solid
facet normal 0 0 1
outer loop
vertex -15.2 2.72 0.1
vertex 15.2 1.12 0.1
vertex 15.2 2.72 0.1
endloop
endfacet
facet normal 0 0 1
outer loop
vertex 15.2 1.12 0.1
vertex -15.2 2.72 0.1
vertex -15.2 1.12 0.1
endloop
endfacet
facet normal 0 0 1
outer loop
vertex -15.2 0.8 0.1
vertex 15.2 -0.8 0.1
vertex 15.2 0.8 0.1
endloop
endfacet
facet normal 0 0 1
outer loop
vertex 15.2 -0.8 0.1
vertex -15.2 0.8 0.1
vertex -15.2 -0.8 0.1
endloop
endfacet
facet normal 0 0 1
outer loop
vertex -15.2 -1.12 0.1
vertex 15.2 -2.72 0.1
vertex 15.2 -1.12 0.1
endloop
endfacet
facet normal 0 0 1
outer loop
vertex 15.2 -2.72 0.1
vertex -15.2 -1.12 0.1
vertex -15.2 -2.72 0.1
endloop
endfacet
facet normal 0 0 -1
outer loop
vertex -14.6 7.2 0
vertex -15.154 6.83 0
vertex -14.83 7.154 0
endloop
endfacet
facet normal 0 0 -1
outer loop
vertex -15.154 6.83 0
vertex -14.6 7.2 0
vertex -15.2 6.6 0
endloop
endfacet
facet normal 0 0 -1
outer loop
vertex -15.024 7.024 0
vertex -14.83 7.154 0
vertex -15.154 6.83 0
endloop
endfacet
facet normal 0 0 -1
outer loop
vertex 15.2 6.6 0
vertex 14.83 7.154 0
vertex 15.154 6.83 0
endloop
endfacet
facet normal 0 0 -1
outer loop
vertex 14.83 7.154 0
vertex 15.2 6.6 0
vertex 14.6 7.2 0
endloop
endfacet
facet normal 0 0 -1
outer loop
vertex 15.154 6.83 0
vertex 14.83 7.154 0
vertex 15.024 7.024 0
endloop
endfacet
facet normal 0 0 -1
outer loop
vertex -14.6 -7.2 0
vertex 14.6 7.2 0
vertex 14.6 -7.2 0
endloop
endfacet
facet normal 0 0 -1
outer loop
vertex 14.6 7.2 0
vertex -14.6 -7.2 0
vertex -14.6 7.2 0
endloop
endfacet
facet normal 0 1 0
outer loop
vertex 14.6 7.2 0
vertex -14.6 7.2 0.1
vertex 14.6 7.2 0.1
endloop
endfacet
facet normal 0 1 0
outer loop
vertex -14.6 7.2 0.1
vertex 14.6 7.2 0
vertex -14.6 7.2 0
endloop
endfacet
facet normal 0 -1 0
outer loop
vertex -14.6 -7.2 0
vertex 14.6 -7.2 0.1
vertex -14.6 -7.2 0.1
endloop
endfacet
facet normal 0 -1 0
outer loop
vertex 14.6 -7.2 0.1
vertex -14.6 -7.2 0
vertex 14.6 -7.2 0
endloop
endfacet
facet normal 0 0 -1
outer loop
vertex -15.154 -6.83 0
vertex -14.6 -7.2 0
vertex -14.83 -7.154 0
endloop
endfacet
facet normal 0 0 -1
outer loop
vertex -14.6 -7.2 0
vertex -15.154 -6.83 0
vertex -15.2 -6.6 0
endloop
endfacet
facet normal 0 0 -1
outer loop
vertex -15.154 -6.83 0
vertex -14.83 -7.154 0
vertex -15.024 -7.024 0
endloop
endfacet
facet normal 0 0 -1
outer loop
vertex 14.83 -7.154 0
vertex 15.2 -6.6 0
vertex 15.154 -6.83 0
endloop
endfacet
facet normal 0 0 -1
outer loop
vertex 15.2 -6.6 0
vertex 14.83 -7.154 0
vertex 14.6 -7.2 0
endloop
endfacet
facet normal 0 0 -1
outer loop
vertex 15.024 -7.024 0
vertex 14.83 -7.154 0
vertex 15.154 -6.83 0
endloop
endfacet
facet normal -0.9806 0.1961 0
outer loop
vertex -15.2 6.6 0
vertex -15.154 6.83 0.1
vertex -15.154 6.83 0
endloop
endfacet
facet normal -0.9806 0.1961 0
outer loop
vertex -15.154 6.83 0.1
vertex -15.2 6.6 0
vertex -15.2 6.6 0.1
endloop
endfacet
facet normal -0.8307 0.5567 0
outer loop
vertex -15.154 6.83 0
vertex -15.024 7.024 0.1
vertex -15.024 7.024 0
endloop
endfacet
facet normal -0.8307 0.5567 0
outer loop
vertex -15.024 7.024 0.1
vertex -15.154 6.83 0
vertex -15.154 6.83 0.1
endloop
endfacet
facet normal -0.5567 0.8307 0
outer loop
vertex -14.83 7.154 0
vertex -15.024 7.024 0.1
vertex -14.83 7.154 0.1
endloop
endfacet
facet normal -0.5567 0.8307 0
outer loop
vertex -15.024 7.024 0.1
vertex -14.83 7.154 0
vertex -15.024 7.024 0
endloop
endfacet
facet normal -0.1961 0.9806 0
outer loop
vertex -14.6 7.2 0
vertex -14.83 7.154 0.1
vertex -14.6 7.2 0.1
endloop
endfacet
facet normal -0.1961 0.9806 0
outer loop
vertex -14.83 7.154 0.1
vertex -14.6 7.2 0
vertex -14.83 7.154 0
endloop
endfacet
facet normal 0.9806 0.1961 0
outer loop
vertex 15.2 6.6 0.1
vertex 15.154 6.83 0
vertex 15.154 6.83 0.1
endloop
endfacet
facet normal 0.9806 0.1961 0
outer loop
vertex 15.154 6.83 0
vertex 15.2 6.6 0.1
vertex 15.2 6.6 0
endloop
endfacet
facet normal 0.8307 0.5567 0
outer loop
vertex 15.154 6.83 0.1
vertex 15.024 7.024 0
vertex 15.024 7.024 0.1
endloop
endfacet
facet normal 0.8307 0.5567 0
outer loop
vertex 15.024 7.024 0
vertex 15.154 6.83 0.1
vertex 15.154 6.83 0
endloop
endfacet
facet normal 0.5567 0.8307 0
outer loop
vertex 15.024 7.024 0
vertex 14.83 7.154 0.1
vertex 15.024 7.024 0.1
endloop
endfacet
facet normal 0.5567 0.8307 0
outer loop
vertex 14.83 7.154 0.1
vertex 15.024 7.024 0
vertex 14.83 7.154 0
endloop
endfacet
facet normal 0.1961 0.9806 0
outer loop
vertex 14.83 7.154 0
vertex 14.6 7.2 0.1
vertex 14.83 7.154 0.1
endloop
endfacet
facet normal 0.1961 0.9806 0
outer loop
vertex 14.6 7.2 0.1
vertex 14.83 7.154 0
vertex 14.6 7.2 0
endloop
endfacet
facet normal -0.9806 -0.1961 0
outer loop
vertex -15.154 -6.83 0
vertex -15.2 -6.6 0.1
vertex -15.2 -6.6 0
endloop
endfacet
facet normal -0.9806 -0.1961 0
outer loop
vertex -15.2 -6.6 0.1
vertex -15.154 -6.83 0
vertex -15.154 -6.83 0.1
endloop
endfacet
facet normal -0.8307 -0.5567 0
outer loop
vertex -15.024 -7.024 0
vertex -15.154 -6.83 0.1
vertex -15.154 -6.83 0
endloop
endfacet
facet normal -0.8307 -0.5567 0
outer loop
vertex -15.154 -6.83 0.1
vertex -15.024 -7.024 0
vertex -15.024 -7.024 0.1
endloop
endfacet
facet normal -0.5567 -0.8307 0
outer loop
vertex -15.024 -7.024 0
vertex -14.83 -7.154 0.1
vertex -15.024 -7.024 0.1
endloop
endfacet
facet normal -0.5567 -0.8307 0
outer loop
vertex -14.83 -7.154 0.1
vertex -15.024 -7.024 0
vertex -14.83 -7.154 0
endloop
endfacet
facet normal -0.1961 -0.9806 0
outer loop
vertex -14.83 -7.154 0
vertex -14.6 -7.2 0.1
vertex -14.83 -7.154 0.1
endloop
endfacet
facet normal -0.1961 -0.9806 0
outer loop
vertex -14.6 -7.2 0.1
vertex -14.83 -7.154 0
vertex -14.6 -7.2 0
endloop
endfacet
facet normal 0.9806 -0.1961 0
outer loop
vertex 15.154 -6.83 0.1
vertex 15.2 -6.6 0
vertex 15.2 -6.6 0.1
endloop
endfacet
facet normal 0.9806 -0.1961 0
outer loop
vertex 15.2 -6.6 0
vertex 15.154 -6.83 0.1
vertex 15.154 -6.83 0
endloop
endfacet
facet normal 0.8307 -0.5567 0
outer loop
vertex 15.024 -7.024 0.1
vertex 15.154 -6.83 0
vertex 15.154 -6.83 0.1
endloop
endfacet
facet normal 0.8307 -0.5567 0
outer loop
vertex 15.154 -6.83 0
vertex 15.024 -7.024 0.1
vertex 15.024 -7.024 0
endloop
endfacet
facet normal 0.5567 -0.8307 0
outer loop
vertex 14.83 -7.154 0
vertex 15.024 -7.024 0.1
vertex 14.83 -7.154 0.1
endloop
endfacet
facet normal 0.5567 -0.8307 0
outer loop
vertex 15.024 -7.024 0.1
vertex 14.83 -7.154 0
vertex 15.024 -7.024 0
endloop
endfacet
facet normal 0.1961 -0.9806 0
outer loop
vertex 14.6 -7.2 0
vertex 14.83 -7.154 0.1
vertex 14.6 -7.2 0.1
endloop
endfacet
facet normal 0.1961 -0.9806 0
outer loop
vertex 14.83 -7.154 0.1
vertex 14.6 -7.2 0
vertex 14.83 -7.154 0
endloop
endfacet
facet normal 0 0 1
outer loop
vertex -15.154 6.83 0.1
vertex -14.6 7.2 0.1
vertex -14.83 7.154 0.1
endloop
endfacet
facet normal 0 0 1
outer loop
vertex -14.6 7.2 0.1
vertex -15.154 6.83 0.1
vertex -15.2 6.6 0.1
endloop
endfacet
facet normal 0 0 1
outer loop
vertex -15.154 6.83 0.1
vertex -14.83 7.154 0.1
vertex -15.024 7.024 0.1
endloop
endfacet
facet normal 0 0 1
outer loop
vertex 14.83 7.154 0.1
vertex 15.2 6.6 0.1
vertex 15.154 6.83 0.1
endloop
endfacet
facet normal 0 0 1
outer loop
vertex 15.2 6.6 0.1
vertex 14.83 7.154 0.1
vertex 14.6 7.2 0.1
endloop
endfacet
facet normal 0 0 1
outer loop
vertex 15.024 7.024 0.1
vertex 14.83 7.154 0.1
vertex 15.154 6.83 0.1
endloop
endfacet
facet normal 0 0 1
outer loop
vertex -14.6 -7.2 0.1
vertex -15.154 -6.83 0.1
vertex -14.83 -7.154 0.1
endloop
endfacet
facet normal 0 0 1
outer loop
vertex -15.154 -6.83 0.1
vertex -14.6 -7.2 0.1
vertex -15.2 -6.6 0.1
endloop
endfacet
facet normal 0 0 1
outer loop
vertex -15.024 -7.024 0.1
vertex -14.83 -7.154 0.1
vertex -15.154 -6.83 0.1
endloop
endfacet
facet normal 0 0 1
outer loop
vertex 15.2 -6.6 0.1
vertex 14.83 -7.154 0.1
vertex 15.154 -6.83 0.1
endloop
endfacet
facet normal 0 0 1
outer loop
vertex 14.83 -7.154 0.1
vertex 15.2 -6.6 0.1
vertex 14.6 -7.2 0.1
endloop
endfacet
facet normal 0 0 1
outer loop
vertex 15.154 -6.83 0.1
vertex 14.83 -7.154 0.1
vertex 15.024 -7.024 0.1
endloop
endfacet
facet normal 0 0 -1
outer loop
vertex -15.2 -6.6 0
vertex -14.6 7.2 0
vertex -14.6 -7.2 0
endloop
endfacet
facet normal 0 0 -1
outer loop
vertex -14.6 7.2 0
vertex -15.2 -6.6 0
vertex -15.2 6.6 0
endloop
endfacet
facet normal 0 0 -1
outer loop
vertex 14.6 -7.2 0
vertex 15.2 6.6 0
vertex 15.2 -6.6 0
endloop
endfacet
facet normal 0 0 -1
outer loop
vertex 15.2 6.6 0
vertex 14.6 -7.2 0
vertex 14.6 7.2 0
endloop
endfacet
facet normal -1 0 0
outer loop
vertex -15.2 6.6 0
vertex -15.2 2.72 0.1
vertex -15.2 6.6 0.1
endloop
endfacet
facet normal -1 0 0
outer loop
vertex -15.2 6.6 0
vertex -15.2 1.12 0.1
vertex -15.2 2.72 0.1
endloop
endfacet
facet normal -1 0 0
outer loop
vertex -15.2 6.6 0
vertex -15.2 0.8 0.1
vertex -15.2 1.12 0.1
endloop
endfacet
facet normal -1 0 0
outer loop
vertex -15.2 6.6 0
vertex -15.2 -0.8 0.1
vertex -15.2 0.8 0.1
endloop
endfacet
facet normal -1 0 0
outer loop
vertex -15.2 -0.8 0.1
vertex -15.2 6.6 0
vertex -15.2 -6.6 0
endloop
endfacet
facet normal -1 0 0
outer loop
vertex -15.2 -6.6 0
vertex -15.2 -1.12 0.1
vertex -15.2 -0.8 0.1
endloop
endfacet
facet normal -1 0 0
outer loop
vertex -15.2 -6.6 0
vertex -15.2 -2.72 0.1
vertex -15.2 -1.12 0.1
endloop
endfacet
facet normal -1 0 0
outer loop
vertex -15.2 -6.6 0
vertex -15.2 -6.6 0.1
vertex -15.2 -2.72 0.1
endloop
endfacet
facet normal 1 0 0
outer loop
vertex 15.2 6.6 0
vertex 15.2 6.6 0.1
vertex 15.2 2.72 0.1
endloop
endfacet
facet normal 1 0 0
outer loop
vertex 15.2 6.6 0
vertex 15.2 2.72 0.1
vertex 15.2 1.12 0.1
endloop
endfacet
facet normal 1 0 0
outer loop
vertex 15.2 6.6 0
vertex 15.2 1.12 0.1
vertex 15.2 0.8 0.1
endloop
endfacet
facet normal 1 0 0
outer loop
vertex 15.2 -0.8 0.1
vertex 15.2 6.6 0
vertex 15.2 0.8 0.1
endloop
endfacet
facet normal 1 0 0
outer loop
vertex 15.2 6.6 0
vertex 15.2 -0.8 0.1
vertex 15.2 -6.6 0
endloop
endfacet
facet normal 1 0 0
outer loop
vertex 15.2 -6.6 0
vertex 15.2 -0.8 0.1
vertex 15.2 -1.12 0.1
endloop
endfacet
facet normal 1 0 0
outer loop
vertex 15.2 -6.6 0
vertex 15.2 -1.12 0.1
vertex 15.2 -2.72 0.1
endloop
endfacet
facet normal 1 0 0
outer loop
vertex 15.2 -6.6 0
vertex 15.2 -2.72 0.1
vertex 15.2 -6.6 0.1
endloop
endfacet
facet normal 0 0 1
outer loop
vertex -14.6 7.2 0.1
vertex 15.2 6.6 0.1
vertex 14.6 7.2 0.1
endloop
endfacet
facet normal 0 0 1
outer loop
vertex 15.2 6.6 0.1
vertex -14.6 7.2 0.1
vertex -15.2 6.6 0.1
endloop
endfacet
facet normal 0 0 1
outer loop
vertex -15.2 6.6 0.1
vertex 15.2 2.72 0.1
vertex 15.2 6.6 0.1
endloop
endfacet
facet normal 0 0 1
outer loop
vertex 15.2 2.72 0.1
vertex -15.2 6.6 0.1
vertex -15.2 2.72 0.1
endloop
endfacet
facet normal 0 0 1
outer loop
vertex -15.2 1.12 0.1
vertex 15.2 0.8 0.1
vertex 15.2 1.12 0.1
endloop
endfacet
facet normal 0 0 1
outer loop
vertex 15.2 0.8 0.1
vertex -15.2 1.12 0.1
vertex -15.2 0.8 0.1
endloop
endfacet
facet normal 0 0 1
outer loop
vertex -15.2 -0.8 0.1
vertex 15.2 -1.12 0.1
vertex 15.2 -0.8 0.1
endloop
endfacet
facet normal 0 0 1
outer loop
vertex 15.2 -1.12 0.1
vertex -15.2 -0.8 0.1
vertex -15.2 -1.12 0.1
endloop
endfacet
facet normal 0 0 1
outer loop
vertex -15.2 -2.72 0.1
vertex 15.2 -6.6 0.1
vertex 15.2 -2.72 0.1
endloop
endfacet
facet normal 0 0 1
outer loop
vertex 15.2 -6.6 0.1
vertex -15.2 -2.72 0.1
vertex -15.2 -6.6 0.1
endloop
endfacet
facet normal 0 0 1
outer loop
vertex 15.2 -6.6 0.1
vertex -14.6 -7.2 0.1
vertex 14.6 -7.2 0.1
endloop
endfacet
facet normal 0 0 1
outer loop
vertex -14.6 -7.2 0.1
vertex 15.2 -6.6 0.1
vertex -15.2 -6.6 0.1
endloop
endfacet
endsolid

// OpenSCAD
// file: ../p/box3u12.scad
use <../lib.scad>
function ldraw_lib__box3u12() = [
// 0 Box with 3 Parallel Faces without Any Edges
// 0 Name: box3u12.dat
// 0 Author: J.C. Tchang [tchang]
// 0 !LDRAW_ORG Primitive UPDATE 2014-02
// 0 !LICENSE Licensed under CC BY 4.0 : see CAreadme.txt
// 
// 0 BFC CERTIFY CCW
  [0,"BFC","CERTIFY"],
  [0,"BFC","CCW"],
// 
// 0 !HISTORY 2014-12-23 [PTadmin] Official Update 2014-02
// 
// 
// 4 16 -1 1 1 1 1 1 1 1 -1 -1 1 -1
  [4,16,-1,1,1,1,1,1,1,1,-1,-1,1,-1],
// 4 16 -1 1 1 -1 0 1 1 0 1 1 1 1
  [4,16,-1,1,1,-1,0,1,1,0,1,1,1,1],
// 4 16 1 1 -1 1 0 -1 -1 0 -1 -1 1 -1
  [4,16,1,1,-1,1,0,-1,-1,0,-1,-1,1,-1],
];
module ldraw_lib__box3u12(step=0, col=false, unit=2/5, alt=false, line=0.2, solid=!$preview)
    makepoly(ldraw_lib__box3u12(), step=step, col=col, unit=unit, alt=alt, line=line, solid=solid);
ldraw_lib__box3u12(line=0.2);
// file: ../p/1-4cyli.scad
use <../lib.scad>
function ldraw_lib__1_4cyli() = [
// 0 Cylinder 0.25
// 0 Name: 1-4cyli.dat
// 0 Author: James Jessiman
// 0 !LDRAW_ORG Primitive UPDATE 2012-01
// 0 !LICENSE Licensed under CC BY 4.0 : see CAreadme.txt
// 
// 0 BFC CERTIFY CCW
  [0,"BFC","CERTIFY"],
  [0,"BFC","CCW"],
// 
// 0 !HISTORY 2002-03-23 [sbliss] Added BFC statement.
// 0 !HISTORY 2002-04-25 [PTadmin] Official Update 2002-02
// 0 !HISTORY 2007-06-22 [PTadmin] Header formatted for Contributor Agreement
// 0 !HISTORY 2008-07-01 [PTadmin] Official Update 2008-01
// 0 !HISTORY 2012-02-16 [Philo] Changed to CCW
// 0 !HISTORY 2012-03-30 [PTadmin] Official Update 2012-01
// 
// 
// 4 16 1 1 0 0.9239 1 0.3827 0.9239 0 0.3827 1 0 0
  [4,16,1,1,0,0.9239,1,0.3827,0.9239,0,0.3827,1,0,0],
// 5 24 1 0 0 1 1 0 0.9239 0 0.3827 1 0 -1
  [5,24,1,0,0,1,1,0,0.9239,0,0.3827,1,0,-1],
// 4 16 0.9239 1 0.3827 0.7071 1 0.7071 0.7071 0 0.7071 0.9239 0 0.3827
  [4,16,0.9239,1,0.3827,0.7071,1,0.7071,0.7071,0,0.7071,0.9239,0,0.3827],
// 5 24 0.9239 0 0.3827 0.9239 1 0.3827 0.7071 0 0.7071 1 0 0
  [5,24,0.9239,0,0.3827,0.9239,1,0.3827,0.7071,0,0.7071,1,0,0],
// 4 16 0.7071 1 0.7071 0.3827 1 0.9239 0.3827 0 0.9239 0.7071 0 0.7071
  [4,16,0.7071,1,0.7071,0.3827,1,0.9239,0.3827,0,0.9239,0.7071,0,0.7071],
// 5 24 0.7071 0 0.7071 0.7071 1 0.7071 0.3827 0 0.9239 0.9239 0 0.3827
  [5,24,0.7071,0,0.7071,0.7071,1,0.7071,0.3827,0,0.9239,0.9239,0,0.3827],
// 4 16 0.3827 1 0.9239 0 1 1 0 0 1 0.3827 0 0.9239
  [4,16,0.3827,1,0.9239,0,1,1,0,0,1,0.3827,0,0.9239],
// 5 24 0.3827 0 0.9239 0.3827 1 0.9239 0 0 1 0.7071 0 0.7071
  [5,24,0.3827,0,0.9239,0.3827,1,0.9239,0,0,1,0.7071,0,0.7071],
// 5 24 0 0 1 0 1 1 0.3827 0 0.9239 -1 0 1
  [5,24,0,0,1,0,1,1,0.3827,0,0.9239,-1,0,1],
];
module ldraw_lib__1_4cyli(step=0, col=false, unit=2/5, alt=false, line=0.2, solid=!$preview)
    makepoly(ldraw_lib__1_4cyli(), step=step, col=col, unit=unit, alt=alt, line=line, solid=solid);
ldraw_lib__1_4cyli(line=0.2);
// file: ../p/1-4chrd.scad
use <../lib.scad>
function ldraw_lib__1_4chrd() = [
// 0 Chord 0.25
// 0 Name: 1-4chrd.dat
// 0 Author: Max Martin Richter [MMR1988]
// 0 !LDRAW_ORG Primitive UPDATE 2023-05
// 0 !LICENSE Licensed under CC BY 4.0 : see CAreadme.txt
// 
// 0 BFC CERTIFY CCW
  [0,"BFC","CERTIFY"],
  [0,"BFC","CCW"],
// 
// 0 !HISTORY 2004-04-22 [PTadmin] Official Update 2004-02
// 0 !HISTORY 2007-10-09 [PTadmin] Header formatted for Contributor Agreement
// 0 !HISTORY 2008-07-01 [PTadmin] Official Update 2008-01
// 0 !HISTORY 2012-08-02 [MMR1988] Re-creation with PrimGen2 and Rectifier
// 0 !HISTORY 2012-08-09 [PTadmin] Official Update 2012-02
// 0 !HISTORY 2023-10-27 [OrionP] Change author to MMR1988 from hafhead
// 0 !HISTORY 2023-10-31 [OrionP] Official Update 2023-05
// 
// 4 16 0.9239 0 0.3827 0.3827 0 0.9239 0 0 1 1 0 0
  [4,16,0.9239,0,0.3827,0.3827,0,0.9239,0,0,1,1,0,0],
// 3 16 0.7071 0 0.7071 0.3827 0 0.9239 0.9239 0 0.3827
  [3,16,0.7071,0,0.7071,0.3827,0,0.9239,0.9239,0,0.3827],
];
module ldraw_lib__1_4chrd(step=0, col=false, unit=2/5, alt=false, line=0.2, solid=!$preview)
    makepoly(ldraw_lib__1_4chrd(), step=step, col=col, unit=unit, alt=alt, line=line, solid=solid);
ldraw_lib__1_4chrd(line=0.2);
// main file
use <../lib.scad>
use <../p/1-4chrd.scad>
use <../p/1-4cyli.scad>
use <../p/box3u12.scad>
function ldraw_lib__6148328r() = [
// 0 Sticker  1.8 x  3.8 with Black Halftone Stripes on White Background (Needs Work)
// 0 Name: 6148328r.dat
// 0 Author: Massimo Maso [Sirio]
// 0 !LDRAW_ORG Part UPDATE 2024-05
// 0 !LICENSE Licensed under CC BY 4.0 : see CAreadme.txt
// 
// 0 !HELP Needs work: halftone stripes are approximate because no high-resolution images are available
// 
// 0 BFC CERTIFY CCW
  [0,"BFC","CERTIFY"],
  [0,"BFC","CCW"],
// 
// 0 !KEYWORDS 917K, 919, Bricklink 75876stk01, Brickowl 852010, Hybrid, Pit Lane
// 0 !KEYWORDS Rebrickable 26357, set 75876, Speed Champions
// 
// 0 !HISTORY 2024-06-30 [OrionP] Official Update 2024-05
// 
// 
// 0 // Textures
// 0 !TEXMAP START PLANAR -38 0 6.8 38 0 6.8 -38 0 2.8 6148328r.png
// 0 !: 4 15 -38 -.25 6.8 -38 -.25 2.8 38 -.25 2.8 38 -.25 6.8
// 0 !TEXMAP FALLBACK
// 
// 4 72 -38 -.25 6.8 -38 -.25 2.8 38 -.25 2.8 38 -.25 6.8
  [4,72,-38,-.25,6.8,-38,-.25,2.8,38,-.25,2.8,38,-.25,6.8],
// 0 !TEXMAP END
// 0 !TEXMAP START PLANAR -38 0 2 38 0 2 -38 0 -2 6148328r.png
// 0 !: 4 15 -38 -.25 2 -38 -.25 -2 38 -.25 -2 38 -.25 2
// 0 !TEXMAP FALLBACK
// 4 72 -38 -.25 2 -38 -.25 -2 38 -.25 -2 38 -.25 2
  [4,72,-38,-.25,2,-38,-.25,-2,38,-.25,-2,38,-.25,2],
// 0 !TEXMAP END
// 0 !TEXMAP START PLANAR -38 0 -2.8 38 0 -2.8 -38 0 -6.8 6148328r.png
// 0 !: 4 15 -38 -.25 -2.8 -38 -.25 -6.8 38 -.25 -6.8 38 -.25 -2.8
// 0 !TEXMAP FALLBACK
// 4 72 -38 -.25 -2.8 -38 -.25 -6.8 38 -.25 -6.8 38 -.25 -2.8
  [4,72,-38,-.25,-2.8,-38,-.25,-6.8,38,-.25,-6.8,38,-.25,-2.8],
// 0 !TEXMAP END
// 0 // Primitives
// 1 16 -36.5 0 16.5 -1.5 0 0 0 -1 0 0 0 1.5 1-4chrd.dat
  [1,16,-36.5,0,16.5,-1.5,0,0,0,-1,0,0,0,1.5, ldraw_lib__1_4chrd()],
// 1 16 36.5 0 16.5 1.5 0 0 0 -1 0 0 0 1.5 1-4chrd.dat
  [1,16,36.5,0,16.5,1.5,0,0,0,-1,0,0,0,1.5, ldraw_lib__1_4chrd()],
// 1 16 0 -.25 0 36.5 0 0 0 .25 0 0 0 18 box3u12.dat
  [1,16,0,-.25,0,36.5,0,0,0,.25,0,0,0,18, ldraw_lib__box3u12()],
// 1 16 -36.5 0 -16.5 -1.5 0 0 0 -1 0 0 0 -1.5 1-4chrd.dat
  [1,16,-36.5,0,-16.5,-1.5,0,0,0,-1,0,0,0,-1.5, ldraw_lib__1_4chrd()],
// 1 16 36.5 0 -16.5 1.5 0 0 0 -1 0 0 0 -1.5 1-4chrd.dat
  [1,16,36.5,0,-16.5,1.5,0,0,0,-1,0,0,0,-1.5, ldraw_lib__1_4chrd()],
// 1 16 -36.5 0 16.5 -1.5 0 0 0 -.25 0 0 0 1.5 1-4cyli.dat
  [1,16,-36.5,0,16.5,-1.5,0,0,0,-.25,0,0,0,1.5, ldraw_lib__1_4cyli()],
// 1 16 36.5 0 16.5 1.5 0 0 0 -.25 0 0 0 1.5 1-4cyli.dat
  [1,16,36.5,0,16.5,1.5,0,0,0,-.25,0,0,0,1.5, ldraw_lib__1_4cyli()],
// 1 16 -36.5 0 -16.5 -1.5 0 0 0 -.25 0 0 0 -1.5 1-4cyli.dat
  [1,16,-36.5,0,-16.5,-1.5,0,0,0,-.25,0,0,0,-1.5, ldraw_lib__1_4cyli()],
// 1 16 36.5 0 -16.5 1.5 0 0 0 -.25 0 0 0 -1.5 1-4cyli.dat
  [1,16,36.5,0,-16.5,1.5,0,0,0,-.25,0,0,0,-1.5, ldraw_lib__1_4cyli()],
// 1 15 -36.5 -.25 16.5 -1.5 0 0 0 1 0 0 0 1.5 1-4chrd.dat
  [1,15,-36.5,-.25,16.5,-1.5,0,0,0,1,0,0,0,1.5, ldraw_lib__1_4chrd()],
// 1 15 36.5 -.25 16.5 1.5 0 0 0 1 0 0 0 1.5 1-4chrd.dat
  [1,15,36.5,-.25,16.5,1.5,0,0,0,1,0,0,0,1.5, ldraw_lib__1_4chrd()],
// 1 15 -36.5 -.25 -16.5 -1.5 0 0 0 1 0 0 0 -1.5 1-4chrd.dat
  [1,15,-36.5,-.25,-16.5,-1.5,0,0,0,1,0,0,0,-1.5, ldraw_lib__1_4chrd()],
// 1 15 36.5 -.25 -16.5 1.5 0 0 0 1 0 0 0 -1.5 1-4chrd.dat
  [1,15,36.5,-.25,-16.5,1.5,0,0,0,1,0,0,0,-1.5, ldraw_lib__1_4chrd()],
// 0 // Bottom faces
// 4 16 -36.5 0 18 -36.5 0 -18 -38 0 -16.5 -38 0 16.5
  [4,16,-36.5,0,18,-36.5,0,-18,-38,0,-16.5,-38,0,16.5],
// 4 16 36.5 0 18 38 0 16.5 38 0 -16.5 36.5 0 -18
  [4,16,36.5,0,18,38,0,16.5,38,0,-16.5,36.5,0,-18],
// 0 // Lateral faces
// 3 16 -38 0 16.5 -38 -.25 6.8 -38 -.25 16.5
  [3,16,-38,0,16.5,-38,-.25,6.8,-38,-.25,16.5],
// 3 16 -38 0 16.5 -38 -.25 2.8 -38 -.25 6.8
  [3,16,-38,0,16.5,-38,-.25,2.8,-38,-.25,6.8],
// 3 16 -38 0 16.5 -38 -.25 2 -38 -.25 2.8
  [3,16,-38,0,16.5,-38,-.25,2,-38,-.25,2.8],
// 4 16 -38 0 16.5 -38 0 -16.5 -38 -.25 -2 -38 -.25 2
  [4,16,-38,0,16.5,-38,0,-16.5,-38,-.25,-2,-38,-.25,2],
// 3 16 -38 0 -16.5 -38 -.25 -2.8 -38 -.25 -2
  [3,16,-38,0,-16.5,-38,-.25,-2.8,-38,-.25,-2],
// 3 16 -38 0 -16.5 -38 -.25 -6.8 -38 -.25 -2.8
  [3,16,-38,0,-16.5,-38,-.25,-6.8,-38,-.25,-2.8],
// 3 16 -38 0 -16.5 -38 -.25 -16.5 -38 -.25 -6.8
  [3,16,-38,0,-16.5,-38,-.25,-16.5,-38,-.25,-6.8],
// 3 16 38 0 16.5 38 -.25 16.5 38 -.25 6.8
  [3,16,38,0,16.5,38,-.25,16.5,38,-.25,6.8],
// 3 16 38 0 16.5 38 -.25 6.8 38 -.25 2.8
  [3,16,38,0,16.5,38,-.25,6.8,38,-.25,2.8],
// 3 16 38 0 16.5 38 -.25 2.8 38 -.25 2
  [3,16,38,0,16.5,38,-.25,2.8,38,-.25,2],
// 4 16 38 0 16.5 38 -.25 2 38 -.25 -2 38 0 -16.5
  [4,16,38,0,16.5,38,-.25,2,38,-.25,-2,38,0,-16.5],
// 3 16 38 0 -16.5 38 -.25 -2 38 -.25 -2.8
  [3,16,38,0,-16.5,38,-.25,-2,38,-.25,-2.8],
// 3 16 38 0 -16.5 38 -.25 -2.8 38 -.25 -6.8
  [3,16,38,0,-16.5,38,-.25,-2.8,38,-.25,-6.8],
// 3 16 38 0 -16.5 38 -.25 -6.8 38 -.25 -16.5
  [3,16,38,0,-16.5,38,-.25,-6.8,38,-.25,-16.5],
// 0 // Top faces
// 4 15 -38 -.25 16.5 38 -.25 16.5 36.5 -.25 18 -36.5 -.25 18
  [4,15,-38,-.25,16.5,38,-.25,16.5,36.5,-.25,18,-36.5,-.25,18],
// 4 15 -38 -.25 16.5 -38 -.25 6.8 38 -.25 6.8 38 -.25 16.5
  [4,15,-38,-.25,16.5,-38,-.25,6.8,38,-.25,6.8,38,-.25,16.5],
// 4 15 -38 -.25 2.8 -38 -.25 2 38 -.25 2 38 -.25 2.8
  [4,15,-38,-.25,2.8,-38,-.25,2,38,-.25,2,38,-.25,2.8],
// 4 15 -38 -.25 -2 -38 -.25 -2.8 38 -.25 -2.8 38 -.25 -2
  [4,15,-38,-.25,-2,-38,-.25,-2.8,38,-.25,-2.8,38,-.25,-2],
// 4 15 -38 -.25 -16.5 38 -.25 -16.5 38 -.25 -6.8 -38 -.25 -6.8
  [4,15,-38,-.25,-16.5,38,-.25,-16.5,38,-.25,-6.8,-38,-.25,-6.8],
// 4 15 -38 -.25 -16.5 -36.5 -.25 -18 36.5 -.25 -18 38 -.25 -16.5
  [4,15,-38,-.25,-16.5,-36.5,-.25,-18,36.5,-.25,-18,38,-.25,-16.5],
];
module ldraw_lib__6148328r(step=0, col=false, unit=2/5, alt=false, line=0.2, solid=!$preview)
    makepoly(ldraw_lib__6148328r(), step=step, col=col, unit=unit, alt=alt, line=line, solid=solid);
ldraw_lib__6148328r(line=0.2);
